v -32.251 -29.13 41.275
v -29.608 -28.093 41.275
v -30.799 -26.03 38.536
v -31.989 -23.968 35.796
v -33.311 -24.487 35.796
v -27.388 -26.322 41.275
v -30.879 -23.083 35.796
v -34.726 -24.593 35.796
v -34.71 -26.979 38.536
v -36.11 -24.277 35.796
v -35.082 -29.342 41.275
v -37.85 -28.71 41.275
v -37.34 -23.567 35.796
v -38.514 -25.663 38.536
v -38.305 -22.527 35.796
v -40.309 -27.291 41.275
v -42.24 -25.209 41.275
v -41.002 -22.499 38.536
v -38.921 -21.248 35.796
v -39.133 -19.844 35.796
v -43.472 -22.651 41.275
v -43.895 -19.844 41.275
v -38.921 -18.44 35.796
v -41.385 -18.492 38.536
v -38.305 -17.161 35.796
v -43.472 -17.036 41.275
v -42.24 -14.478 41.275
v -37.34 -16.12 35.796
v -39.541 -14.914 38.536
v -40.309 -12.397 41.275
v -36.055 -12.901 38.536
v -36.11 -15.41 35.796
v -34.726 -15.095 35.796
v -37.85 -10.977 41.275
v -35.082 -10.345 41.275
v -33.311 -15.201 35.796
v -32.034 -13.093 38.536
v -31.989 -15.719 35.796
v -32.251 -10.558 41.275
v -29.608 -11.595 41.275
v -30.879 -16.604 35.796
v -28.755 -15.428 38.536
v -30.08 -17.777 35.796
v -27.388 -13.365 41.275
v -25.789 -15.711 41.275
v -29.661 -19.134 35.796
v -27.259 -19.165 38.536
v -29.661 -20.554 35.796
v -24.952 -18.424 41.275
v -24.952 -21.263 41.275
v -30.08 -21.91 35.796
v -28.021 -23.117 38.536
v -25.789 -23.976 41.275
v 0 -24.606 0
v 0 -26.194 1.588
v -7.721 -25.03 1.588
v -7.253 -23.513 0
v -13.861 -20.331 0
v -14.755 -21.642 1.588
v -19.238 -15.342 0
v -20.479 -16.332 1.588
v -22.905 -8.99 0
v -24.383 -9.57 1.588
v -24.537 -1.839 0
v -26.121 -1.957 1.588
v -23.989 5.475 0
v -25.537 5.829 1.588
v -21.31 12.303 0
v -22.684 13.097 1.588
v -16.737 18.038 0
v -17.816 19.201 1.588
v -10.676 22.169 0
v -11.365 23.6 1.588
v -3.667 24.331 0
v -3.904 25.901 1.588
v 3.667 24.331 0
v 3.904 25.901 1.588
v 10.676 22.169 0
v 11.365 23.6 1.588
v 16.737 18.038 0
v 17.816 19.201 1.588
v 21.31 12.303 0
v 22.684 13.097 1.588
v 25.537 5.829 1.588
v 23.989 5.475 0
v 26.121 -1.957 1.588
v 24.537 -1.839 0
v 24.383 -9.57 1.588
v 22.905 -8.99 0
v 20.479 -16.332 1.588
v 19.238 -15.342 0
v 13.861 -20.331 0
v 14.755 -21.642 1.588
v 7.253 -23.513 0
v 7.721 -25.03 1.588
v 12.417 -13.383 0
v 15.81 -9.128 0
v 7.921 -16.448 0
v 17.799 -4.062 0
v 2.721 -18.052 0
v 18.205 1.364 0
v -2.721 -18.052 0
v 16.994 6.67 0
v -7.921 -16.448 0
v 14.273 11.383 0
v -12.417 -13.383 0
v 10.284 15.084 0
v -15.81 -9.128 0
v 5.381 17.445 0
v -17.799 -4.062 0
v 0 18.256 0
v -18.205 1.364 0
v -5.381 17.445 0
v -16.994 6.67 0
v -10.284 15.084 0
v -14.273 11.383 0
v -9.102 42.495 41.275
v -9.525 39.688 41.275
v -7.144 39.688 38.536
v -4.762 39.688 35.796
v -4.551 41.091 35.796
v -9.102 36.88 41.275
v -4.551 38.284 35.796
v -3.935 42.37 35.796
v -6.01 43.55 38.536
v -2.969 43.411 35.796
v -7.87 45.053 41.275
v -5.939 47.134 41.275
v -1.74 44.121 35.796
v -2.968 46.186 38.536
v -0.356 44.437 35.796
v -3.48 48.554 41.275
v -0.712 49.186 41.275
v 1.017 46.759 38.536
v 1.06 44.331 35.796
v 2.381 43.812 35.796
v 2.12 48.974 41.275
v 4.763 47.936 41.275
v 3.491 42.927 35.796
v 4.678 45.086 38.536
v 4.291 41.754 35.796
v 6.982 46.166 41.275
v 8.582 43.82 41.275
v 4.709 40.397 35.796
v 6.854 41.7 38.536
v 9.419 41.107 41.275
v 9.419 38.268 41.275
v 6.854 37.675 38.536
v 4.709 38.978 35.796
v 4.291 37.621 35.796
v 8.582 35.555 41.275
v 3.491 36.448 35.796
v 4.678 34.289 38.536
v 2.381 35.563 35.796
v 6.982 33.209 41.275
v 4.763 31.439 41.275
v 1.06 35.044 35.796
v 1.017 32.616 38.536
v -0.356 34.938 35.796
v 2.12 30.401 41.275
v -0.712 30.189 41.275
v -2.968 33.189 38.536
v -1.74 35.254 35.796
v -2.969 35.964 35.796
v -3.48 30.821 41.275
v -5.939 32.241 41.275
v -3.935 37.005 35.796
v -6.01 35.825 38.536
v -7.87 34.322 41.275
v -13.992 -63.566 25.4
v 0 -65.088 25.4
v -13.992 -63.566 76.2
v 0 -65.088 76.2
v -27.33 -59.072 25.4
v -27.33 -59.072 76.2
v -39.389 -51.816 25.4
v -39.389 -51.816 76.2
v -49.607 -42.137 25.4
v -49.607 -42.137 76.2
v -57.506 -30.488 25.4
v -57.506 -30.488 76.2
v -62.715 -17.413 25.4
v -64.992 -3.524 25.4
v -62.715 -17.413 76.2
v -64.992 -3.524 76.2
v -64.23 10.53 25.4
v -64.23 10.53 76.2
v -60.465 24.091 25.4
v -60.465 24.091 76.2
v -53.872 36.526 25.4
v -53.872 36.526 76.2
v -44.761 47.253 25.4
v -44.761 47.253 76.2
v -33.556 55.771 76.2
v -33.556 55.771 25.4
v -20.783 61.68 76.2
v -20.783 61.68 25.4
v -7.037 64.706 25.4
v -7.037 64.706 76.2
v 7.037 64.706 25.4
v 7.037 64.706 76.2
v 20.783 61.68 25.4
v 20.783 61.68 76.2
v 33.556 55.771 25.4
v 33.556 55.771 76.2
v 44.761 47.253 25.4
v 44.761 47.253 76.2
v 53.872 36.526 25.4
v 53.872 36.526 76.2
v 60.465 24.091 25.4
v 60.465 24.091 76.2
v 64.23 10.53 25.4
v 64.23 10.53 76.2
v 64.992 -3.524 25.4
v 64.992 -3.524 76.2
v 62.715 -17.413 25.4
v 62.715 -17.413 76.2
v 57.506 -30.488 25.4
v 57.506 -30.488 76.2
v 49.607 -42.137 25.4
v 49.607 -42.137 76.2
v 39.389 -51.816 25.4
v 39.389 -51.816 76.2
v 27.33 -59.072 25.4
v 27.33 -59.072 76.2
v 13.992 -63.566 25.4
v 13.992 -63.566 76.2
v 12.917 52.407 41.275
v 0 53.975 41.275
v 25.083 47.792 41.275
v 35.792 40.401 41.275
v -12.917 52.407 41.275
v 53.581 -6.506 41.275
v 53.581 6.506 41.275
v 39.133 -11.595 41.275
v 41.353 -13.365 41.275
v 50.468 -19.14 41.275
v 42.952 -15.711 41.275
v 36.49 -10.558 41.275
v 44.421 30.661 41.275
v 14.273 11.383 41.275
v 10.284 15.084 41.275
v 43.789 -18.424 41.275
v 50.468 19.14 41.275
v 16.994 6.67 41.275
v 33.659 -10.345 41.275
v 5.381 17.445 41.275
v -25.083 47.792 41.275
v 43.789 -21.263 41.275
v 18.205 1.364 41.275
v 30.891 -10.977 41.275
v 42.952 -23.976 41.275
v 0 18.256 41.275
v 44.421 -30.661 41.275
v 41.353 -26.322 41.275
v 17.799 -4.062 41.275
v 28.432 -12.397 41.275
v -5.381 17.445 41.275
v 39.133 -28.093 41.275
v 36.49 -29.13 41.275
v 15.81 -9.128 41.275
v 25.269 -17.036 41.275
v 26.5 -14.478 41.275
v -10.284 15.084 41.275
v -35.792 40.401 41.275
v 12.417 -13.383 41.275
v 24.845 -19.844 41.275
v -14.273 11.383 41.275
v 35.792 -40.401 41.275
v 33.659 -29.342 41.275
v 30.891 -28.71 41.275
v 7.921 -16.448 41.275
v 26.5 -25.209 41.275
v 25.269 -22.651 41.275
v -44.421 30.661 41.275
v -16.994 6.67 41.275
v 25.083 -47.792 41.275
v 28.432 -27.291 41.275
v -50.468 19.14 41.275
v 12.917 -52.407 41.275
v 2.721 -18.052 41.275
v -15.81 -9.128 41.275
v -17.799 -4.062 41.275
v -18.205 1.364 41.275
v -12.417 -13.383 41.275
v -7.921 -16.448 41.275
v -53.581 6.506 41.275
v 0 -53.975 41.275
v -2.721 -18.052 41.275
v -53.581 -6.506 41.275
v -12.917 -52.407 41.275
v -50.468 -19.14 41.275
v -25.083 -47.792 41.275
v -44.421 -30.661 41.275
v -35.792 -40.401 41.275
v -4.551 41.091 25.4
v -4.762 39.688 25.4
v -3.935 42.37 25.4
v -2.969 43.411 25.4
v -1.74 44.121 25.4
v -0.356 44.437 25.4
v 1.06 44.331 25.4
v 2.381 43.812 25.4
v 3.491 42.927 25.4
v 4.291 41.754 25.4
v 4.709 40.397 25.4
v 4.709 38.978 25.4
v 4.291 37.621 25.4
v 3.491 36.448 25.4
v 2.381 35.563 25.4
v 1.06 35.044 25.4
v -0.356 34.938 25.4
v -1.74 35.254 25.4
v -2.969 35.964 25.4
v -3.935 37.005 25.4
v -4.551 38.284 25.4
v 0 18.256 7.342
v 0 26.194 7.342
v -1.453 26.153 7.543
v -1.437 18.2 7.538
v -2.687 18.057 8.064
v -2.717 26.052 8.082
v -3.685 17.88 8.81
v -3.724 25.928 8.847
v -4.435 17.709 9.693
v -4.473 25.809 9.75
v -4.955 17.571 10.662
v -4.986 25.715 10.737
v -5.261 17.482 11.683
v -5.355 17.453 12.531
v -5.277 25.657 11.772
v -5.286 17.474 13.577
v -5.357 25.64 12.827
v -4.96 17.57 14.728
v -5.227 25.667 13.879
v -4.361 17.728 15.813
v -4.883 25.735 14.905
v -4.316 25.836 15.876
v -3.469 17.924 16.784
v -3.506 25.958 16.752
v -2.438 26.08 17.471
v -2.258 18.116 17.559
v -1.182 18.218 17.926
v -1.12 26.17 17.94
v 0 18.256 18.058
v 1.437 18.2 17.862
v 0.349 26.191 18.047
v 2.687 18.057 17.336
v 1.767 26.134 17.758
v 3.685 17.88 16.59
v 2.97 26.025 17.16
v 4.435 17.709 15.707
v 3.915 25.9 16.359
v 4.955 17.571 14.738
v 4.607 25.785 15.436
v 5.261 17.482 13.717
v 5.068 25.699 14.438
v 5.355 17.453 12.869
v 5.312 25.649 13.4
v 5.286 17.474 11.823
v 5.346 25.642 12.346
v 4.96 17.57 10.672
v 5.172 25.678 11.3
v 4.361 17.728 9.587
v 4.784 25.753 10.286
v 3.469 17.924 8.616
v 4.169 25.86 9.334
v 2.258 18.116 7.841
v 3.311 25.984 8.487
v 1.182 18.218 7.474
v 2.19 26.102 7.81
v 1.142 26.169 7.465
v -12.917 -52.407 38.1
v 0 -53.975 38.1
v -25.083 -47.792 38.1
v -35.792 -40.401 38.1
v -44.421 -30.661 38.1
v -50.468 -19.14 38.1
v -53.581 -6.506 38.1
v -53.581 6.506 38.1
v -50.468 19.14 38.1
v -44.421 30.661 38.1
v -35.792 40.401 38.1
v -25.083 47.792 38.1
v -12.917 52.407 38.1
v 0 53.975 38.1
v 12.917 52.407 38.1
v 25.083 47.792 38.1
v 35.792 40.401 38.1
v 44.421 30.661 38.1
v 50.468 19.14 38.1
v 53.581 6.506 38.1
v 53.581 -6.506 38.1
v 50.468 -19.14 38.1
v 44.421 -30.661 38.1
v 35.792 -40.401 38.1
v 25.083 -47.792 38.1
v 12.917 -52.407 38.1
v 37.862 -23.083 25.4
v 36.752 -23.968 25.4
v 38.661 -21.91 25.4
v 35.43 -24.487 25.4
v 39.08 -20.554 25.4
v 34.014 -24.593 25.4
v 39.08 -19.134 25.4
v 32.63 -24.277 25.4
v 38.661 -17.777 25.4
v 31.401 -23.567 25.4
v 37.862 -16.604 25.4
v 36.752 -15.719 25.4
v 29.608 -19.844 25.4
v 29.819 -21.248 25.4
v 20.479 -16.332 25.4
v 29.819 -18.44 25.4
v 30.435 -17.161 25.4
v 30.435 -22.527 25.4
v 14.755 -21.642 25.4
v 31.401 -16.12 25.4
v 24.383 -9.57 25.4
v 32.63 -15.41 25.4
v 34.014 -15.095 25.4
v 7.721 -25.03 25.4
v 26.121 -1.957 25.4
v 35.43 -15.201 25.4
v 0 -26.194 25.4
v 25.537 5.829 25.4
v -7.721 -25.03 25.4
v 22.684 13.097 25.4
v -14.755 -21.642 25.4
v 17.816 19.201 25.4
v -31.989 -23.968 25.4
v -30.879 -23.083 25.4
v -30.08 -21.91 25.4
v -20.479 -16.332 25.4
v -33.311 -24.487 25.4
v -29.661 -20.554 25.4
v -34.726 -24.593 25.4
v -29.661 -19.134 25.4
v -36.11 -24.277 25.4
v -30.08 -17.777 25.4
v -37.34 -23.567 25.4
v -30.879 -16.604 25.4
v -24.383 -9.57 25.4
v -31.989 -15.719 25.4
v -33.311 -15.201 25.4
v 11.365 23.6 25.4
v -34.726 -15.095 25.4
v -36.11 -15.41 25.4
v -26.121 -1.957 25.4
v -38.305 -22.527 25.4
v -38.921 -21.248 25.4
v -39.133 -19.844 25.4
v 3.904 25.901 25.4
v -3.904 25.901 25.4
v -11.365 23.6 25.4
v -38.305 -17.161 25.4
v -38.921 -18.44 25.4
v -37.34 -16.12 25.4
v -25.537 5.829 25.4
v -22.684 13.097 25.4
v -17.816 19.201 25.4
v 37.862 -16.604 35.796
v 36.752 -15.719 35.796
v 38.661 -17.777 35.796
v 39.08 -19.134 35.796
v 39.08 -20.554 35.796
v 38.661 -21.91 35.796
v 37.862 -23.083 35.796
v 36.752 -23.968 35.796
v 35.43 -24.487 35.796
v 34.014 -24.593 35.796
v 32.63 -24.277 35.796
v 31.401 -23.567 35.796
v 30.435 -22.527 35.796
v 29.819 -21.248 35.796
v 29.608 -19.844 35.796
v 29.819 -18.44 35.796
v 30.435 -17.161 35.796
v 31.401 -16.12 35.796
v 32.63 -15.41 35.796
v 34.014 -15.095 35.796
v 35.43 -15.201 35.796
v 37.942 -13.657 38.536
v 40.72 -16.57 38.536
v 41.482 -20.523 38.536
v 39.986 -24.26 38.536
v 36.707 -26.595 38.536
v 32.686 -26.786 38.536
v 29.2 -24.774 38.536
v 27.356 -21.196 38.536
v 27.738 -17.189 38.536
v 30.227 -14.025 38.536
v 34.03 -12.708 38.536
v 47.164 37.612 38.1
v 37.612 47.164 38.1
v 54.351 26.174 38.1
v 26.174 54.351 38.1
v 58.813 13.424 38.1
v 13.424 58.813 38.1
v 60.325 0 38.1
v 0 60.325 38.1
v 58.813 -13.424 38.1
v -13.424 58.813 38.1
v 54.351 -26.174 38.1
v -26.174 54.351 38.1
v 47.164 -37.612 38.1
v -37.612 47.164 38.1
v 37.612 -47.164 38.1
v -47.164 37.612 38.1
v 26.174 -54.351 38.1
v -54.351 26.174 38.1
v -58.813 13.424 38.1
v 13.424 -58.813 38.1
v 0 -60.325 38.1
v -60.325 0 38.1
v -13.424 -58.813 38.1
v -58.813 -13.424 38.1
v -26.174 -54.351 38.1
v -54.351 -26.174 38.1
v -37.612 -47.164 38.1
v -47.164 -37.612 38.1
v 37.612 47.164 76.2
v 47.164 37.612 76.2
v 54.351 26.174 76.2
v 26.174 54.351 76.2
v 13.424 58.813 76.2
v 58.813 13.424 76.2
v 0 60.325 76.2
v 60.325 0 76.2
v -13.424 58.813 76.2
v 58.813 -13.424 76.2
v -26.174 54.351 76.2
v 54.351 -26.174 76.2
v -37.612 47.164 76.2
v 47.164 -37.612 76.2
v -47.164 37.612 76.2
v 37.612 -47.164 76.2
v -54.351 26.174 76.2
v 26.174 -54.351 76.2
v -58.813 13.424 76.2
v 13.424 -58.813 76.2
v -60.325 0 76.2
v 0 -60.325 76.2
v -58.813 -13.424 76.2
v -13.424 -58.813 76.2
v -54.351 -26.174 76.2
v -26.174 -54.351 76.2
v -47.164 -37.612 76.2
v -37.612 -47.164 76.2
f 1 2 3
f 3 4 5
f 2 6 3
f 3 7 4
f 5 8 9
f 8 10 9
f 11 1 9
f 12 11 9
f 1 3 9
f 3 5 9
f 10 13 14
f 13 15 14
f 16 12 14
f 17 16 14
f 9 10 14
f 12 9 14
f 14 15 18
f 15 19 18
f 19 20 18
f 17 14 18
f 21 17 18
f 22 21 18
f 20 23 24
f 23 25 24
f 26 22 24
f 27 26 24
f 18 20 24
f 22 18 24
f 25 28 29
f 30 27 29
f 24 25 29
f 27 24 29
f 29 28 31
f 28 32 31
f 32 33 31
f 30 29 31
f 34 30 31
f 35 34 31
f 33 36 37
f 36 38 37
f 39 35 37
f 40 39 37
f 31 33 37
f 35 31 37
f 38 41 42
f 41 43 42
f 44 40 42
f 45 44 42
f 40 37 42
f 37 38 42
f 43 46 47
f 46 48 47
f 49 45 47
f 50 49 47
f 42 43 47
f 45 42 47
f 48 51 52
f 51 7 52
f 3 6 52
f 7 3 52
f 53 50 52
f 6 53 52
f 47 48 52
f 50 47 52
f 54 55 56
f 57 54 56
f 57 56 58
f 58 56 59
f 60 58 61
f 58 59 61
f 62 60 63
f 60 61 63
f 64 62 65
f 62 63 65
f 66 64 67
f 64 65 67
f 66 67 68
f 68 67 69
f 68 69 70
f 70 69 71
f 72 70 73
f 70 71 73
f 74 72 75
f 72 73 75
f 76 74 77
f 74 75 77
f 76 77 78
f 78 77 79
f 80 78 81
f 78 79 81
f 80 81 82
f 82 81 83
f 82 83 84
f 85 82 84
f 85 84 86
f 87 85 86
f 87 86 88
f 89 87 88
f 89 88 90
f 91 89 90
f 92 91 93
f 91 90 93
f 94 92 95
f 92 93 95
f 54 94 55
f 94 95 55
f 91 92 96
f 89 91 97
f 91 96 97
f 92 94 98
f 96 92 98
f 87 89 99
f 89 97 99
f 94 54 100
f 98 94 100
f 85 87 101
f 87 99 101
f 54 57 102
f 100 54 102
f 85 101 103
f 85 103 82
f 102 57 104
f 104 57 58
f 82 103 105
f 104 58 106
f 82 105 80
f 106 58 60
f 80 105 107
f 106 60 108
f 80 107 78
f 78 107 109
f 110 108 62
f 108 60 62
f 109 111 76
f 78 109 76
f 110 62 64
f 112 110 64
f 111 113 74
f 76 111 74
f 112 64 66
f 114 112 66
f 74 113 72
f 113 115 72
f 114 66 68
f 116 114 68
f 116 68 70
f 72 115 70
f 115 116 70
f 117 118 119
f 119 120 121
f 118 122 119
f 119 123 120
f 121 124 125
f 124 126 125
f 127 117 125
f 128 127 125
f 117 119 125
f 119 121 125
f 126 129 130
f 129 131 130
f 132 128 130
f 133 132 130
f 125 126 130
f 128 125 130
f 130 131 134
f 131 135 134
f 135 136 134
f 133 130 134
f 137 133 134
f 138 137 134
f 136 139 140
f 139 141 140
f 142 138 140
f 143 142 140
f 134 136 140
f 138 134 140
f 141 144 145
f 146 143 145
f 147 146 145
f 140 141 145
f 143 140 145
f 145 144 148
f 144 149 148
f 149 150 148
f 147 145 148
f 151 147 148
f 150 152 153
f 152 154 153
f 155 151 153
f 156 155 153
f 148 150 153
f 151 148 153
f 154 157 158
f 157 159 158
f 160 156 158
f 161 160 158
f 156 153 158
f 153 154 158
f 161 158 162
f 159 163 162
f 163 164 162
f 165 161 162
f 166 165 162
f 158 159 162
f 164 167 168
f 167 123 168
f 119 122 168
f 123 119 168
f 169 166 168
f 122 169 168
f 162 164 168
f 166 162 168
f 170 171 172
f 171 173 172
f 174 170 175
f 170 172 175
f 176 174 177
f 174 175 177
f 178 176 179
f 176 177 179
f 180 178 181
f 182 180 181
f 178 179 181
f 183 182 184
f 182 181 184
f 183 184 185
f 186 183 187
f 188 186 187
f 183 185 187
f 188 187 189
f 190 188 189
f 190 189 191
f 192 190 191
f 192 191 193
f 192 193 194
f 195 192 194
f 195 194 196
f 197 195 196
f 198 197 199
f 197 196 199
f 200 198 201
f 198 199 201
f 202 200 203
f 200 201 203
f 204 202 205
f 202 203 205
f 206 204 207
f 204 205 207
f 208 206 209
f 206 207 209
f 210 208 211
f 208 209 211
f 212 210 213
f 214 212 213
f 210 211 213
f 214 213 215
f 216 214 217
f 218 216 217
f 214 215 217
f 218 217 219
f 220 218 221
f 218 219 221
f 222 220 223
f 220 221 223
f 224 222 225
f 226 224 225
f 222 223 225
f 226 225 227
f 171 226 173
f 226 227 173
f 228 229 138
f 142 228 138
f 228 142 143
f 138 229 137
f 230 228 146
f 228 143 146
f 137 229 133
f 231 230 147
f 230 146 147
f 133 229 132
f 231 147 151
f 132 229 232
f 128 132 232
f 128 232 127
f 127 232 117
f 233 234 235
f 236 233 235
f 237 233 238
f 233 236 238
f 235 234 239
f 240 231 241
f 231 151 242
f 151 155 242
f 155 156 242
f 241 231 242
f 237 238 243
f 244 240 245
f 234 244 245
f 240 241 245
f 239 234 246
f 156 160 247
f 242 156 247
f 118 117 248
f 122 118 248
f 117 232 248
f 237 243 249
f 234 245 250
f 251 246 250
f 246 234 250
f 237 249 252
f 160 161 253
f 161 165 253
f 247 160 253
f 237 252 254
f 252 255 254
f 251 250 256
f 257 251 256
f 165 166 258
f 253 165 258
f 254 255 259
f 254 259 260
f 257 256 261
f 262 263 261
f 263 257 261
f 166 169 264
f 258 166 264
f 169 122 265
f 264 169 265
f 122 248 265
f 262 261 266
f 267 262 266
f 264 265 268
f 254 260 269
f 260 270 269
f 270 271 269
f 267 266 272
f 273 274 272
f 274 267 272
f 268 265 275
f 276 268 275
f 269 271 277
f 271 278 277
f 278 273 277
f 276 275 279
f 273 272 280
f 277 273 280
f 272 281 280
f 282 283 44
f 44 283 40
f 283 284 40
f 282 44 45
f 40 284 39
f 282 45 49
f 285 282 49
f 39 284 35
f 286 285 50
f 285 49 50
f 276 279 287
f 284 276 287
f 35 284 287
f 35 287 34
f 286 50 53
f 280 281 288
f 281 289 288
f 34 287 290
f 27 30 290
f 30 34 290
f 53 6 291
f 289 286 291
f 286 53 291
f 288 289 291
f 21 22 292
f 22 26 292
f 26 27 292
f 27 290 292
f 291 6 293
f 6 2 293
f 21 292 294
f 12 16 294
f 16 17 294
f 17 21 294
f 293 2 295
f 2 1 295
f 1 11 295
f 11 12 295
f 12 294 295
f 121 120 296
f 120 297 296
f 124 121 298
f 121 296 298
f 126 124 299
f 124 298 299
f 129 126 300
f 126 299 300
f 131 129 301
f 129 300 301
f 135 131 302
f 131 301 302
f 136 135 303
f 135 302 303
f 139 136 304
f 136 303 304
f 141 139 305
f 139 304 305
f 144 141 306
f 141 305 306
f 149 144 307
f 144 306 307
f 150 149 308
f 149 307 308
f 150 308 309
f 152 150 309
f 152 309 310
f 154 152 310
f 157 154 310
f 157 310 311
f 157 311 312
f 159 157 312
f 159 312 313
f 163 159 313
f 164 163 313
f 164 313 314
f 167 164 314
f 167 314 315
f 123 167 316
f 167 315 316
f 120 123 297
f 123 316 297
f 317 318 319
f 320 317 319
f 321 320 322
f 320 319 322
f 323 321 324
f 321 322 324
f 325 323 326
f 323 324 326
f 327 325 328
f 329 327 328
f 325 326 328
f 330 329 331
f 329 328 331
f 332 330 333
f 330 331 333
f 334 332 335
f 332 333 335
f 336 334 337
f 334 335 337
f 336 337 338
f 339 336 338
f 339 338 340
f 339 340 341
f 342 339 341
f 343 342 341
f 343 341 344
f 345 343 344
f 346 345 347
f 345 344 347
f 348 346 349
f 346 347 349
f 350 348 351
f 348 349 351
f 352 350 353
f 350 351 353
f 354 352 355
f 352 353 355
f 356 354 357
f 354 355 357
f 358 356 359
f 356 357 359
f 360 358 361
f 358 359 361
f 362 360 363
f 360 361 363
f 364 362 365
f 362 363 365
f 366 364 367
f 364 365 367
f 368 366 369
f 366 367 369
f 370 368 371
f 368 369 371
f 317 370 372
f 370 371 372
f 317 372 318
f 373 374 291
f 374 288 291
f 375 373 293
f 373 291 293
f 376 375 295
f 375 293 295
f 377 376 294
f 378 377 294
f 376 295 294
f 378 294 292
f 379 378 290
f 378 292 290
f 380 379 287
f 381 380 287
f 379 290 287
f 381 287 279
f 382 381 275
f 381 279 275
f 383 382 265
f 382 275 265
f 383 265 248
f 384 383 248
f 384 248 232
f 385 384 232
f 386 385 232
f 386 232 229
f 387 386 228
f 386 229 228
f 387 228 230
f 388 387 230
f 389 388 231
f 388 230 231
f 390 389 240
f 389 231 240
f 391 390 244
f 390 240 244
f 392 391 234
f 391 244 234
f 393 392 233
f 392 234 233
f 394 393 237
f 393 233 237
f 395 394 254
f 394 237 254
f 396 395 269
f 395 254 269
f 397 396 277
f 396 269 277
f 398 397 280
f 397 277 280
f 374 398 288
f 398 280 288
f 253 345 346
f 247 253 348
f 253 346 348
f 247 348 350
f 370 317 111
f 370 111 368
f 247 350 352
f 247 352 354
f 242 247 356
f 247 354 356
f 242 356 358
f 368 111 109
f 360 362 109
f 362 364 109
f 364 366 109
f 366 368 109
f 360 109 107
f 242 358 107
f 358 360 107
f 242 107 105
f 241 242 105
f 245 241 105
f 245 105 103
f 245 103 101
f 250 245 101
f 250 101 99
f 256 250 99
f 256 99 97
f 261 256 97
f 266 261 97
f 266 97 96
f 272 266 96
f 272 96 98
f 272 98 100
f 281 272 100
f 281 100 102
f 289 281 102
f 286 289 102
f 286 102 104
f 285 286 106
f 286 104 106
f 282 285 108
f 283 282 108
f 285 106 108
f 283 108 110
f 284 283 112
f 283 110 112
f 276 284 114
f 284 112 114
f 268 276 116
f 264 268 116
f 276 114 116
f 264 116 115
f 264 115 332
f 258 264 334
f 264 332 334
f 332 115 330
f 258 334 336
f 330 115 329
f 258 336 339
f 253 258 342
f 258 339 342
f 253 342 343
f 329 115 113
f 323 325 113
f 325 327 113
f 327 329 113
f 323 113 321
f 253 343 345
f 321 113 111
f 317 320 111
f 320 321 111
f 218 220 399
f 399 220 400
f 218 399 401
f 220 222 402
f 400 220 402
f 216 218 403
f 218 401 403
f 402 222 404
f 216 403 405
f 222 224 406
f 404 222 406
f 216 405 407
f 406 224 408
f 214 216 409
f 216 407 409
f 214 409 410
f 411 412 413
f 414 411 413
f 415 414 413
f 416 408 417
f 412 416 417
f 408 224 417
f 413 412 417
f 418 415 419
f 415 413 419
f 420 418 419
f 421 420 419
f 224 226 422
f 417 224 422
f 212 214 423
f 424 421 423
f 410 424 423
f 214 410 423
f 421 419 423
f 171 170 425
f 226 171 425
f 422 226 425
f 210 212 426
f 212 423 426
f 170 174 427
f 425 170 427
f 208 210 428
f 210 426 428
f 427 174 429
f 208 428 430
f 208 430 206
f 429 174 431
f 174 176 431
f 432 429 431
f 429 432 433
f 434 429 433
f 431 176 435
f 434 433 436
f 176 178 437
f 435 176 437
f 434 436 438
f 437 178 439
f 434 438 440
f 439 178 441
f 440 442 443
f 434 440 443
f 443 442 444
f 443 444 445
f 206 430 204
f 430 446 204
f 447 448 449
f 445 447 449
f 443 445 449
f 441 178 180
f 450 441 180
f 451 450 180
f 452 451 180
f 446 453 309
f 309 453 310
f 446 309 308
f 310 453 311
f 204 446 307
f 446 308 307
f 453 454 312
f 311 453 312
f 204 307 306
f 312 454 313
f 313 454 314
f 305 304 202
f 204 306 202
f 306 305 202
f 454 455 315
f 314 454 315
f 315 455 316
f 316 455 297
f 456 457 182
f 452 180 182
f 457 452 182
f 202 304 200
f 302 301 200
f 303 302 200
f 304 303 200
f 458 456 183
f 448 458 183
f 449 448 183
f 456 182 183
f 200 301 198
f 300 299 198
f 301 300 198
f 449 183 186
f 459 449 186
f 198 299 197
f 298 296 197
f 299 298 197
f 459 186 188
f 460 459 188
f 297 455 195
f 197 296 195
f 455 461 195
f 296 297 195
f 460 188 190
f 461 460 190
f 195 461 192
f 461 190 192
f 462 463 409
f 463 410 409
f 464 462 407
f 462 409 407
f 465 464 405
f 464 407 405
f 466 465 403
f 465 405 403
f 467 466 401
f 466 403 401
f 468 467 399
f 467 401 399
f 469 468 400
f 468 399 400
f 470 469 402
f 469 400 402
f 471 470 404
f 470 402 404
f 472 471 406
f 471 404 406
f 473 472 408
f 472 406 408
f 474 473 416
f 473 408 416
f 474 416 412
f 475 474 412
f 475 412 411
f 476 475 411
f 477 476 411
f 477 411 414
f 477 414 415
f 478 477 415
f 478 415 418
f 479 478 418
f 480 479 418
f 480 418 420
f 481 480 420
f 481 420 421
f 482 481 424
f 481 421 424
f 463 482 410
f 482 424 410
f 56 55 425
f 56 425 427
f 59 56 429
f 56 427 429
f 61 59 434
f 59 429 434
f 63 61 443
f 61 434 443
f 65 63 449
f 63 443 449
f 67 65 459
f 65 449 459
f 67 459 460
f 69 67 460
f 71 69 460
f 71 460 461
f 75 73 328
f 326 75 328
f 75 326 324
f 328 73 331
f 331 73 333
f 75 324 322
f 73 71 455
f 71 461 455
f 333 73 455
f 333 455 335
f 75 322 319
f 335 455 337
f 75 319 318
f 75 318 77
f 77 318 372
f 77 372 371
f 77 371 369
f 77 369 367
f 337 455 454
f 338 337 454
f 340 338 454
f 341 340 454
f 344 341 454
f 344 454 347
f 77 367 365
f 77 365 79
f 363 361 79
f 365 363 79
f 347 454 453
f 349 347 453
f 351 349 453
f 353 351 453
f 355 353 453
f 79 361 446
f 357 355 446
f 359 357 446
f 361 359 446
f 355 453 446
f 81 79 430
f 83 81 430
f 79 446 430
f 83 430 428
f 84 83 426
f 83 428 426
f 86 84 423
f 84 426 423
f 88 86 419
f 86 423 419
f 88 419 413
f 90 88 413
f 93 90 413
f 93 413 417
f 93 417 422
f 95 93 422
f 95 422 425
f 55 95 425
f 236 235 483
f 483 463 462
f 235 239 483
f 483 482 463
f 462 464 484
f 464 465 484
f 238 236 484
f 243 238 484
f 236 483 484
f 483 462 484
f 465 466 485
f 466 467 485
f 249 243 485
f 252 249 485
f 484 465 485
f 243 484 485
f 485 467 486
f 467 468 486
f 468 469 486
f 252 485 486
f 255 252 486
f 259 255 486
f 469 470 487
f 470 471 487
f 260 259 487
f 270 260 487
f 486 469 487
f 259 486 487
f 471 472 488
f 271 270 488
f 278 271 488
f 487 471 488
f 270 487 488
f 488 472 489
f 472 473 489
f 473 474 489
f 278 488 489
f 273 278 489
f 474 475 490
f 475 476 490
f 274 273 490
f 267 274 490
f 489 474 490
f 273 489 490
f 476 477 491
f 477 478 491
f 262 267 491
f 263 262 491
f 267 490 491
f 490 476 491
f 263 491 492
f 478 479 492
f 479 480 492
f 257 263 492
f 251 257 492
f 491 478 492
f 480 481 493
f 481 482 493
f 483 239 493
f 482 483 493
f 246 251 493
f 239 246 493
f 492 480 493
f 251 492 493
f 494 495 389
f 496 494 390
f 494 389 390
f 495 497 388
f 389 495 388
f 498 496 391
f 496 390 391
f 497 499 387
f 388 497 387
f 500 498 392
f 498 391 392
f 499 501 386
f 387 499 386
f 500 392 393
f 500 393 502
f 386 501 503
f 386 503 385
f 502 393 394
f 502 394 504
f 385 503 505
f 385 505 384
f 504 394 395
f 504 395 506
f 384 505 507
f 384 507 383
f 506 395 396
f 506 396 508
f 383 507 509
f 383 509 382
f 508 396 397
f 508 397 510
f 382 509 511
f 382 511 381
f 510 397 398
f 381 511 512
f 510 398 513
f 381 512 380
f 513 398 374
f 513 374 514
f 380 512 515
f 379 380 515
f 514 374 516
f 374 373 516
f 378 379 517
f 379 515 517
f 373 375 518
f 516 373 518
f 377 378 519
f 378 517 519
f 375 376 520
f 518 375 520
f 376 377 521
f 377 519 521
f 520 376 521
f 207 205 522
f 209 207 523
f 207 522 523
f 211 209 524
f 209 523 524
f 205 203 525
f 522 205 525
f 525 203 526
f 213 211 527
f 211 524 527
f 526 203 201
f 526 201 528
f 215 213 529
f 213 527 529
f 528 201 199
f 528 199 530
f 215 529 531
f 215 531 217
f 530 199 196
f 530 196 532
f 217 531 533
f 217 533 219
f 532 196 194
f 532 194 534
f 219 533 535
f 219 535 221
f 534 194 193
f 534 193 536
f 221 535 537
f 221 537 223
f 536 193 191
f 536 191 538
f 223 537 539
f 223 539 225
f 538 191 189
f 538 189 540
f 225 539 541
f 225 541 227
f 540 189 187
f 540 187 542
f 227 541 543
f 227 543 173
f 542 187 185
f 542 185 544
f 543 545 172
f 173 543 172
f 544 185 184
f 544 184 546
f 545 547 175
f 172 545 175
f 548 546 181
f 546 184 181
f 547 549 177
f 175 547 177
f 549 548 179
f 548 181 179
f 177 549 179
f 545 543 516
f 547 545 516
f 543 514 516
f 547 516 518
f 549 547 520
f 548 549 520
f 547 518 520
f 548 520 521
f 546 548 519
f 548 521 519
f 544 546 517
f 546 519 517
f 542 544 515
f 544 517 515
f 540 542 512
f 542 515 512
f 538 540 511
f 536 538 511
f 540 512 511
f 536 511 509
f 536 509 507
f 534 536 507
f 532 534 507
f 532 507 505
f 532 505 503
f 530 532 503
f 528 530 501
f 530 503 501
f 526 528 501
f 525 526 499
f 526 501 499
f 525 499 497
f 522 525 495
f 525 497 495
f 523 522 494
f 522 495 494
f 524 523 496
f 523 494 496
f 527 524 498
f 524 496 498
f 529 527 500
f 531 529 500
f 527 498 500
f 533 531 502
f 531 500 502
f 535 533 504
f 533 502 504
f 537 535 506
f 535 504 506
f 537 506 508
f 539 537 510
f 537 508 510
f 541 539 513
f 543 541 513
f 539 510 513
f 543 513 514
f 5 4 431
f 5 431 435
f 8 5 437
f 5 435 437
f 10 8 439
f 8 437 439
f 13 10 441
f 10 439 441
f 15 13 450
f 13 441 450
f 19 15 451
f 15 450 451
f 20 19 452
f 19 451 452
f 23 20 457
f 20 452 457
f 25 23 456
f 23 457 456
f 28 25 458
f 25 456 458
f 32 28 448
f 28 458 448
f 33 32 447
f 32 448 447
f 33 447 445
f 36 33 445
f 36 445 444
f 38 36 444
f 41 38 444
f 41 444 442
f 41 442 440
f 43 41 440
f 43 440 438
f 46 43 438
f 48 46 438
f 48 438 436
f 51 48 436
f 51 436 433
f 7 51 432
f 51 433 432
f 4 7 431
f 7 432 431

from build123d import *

# Parameters (mm, degrees)
ESQUISSE3_R                                       = 18.25625
ENL_V_MAT_EXTRU_1_DEPTH                           = 120.495628843
FRAISAGE_POUR_VIS_T_TE_FRAIS_E_BOMB_E_D           = 9.525
FRAISAGE_POUR_VIS_T_TE_FRAIS_E_BOMB_E_CSINK_D     = 19.05
FRAISAGE_POUR_VIS_T_TE_FRAIS_E_BOMB_E_CSINK_ANGLE = 82
R_P_TITION_CIRCULAIRE1_COUNT                      = 3
CHANFREIN1_SIZE                                   = 1.5875
ESQUISSE7_W                                       = 5.35813
ESQUISSE7_H                                       = 65.0875


with BuildPart() as part:
    # Esquisse2 → Révolution2 (revolve)
    with BuildSketch(Plane(origin=(0, 0, 0), x_dir=(0, 0, -1), z_dir=(1, 0, 0)), mode=Mode.PRIVATE) as r_volution2_sk:
        Polygon((0, 0), (0, 26.19375), (-25.4, 26.19375), (-25.4, 65.0875), (-76.2, 65.0875), (-76.2, 60.325), (-38.1, 60.325), (-38.1, 53.975), (-41.275, 53.975), (-41.275, 0), align=None)
    revolve(r_volution2_sk.sketch.rotate(Axis((0, 0, 41.275), (0, 0, -1)), 180), axis=Axis((0, 0, 41.275), (0, 0, -1)))

    # Esquisse3 → Enlèv. mat.-Extru.1 (cut, through all)
    with BuildSketch(Plane(origin=(0, 0, 0), x_dir=(-1, 0, 0), z_dir=(0, 0, -1))):
        with Locations(Location((0, 0, 0), (0, 0, 90))):
            Circle(ESQUISSE3_R)
    extrude(amount=-ENL_V_MAT_EXTRU_1_DEPTH, mode=Mode.SUBTRACT)

    # Fraisage pour vis à tête fraisée bombée 3/81 (through all)
    with Locations(Plane.XY.offset(41.275)):
        with Locations((0, 39.6875)):
            fraisage_pour_vis_t_te_frais_e_bomb_e = CounterSinkHole(FRAISAGE_POUR_VIS_T_TE_FRAIS_E_BOMB_E_D / 2, FRAISAGE_POUR_VIS_T_TE_FRAIS_E_BOMB_E_CSINK_D / 2, counter_sink_angle=FRAISAGE_POUR_VIS_T_TE_FRAIS_E_BOMB_E_CSINK_ANGLE)

    # Répétition circulaire1: Fraisage pour vis à tête fraisée bombée 3/81 ×3 about axis
    r_p_tition_circulaire1_axis = Axis((0, 0, 0), (0, 0, 1))
    for i in range(1, R_P_TITION_CIRCULAIRE1_COUNT):
        add(fraisage_pour_vis_t_te_frais_e_bomb_e.rotate(r_p_tition_circulaire1_axis, i * 360 / R_P_TITION_CIRCULAIRE1_COUNT), mode=Mode.SUBTRACT)

    # Chanfrein1
    chanfrein1_edges = [part.edges().sort_by_distance(p)[0] for p in [
        (0, 26.19375, 0),
    ]]
    chamfer(chanfrein1_edges, length=CHANFREIN1_SIZE)

    # Esquisse7 → Trou taraudé 1/2-131 (revolve, cut)
    with BuildSketch(Plane(origin=(0, 0, 12.7), x_dir=(0, 0, -1), z_dir=(1, 0, 0))):
        with Locations((2.679065, 32.54375)):
            Rectangle(ESQUISSE7_W, ESQUISSE7_H)
    revolve(axis=Axis((0, -6.35, 12.7), (0, 1, 0)), mode=Mode.SUBTRACT)


solid = part.part
